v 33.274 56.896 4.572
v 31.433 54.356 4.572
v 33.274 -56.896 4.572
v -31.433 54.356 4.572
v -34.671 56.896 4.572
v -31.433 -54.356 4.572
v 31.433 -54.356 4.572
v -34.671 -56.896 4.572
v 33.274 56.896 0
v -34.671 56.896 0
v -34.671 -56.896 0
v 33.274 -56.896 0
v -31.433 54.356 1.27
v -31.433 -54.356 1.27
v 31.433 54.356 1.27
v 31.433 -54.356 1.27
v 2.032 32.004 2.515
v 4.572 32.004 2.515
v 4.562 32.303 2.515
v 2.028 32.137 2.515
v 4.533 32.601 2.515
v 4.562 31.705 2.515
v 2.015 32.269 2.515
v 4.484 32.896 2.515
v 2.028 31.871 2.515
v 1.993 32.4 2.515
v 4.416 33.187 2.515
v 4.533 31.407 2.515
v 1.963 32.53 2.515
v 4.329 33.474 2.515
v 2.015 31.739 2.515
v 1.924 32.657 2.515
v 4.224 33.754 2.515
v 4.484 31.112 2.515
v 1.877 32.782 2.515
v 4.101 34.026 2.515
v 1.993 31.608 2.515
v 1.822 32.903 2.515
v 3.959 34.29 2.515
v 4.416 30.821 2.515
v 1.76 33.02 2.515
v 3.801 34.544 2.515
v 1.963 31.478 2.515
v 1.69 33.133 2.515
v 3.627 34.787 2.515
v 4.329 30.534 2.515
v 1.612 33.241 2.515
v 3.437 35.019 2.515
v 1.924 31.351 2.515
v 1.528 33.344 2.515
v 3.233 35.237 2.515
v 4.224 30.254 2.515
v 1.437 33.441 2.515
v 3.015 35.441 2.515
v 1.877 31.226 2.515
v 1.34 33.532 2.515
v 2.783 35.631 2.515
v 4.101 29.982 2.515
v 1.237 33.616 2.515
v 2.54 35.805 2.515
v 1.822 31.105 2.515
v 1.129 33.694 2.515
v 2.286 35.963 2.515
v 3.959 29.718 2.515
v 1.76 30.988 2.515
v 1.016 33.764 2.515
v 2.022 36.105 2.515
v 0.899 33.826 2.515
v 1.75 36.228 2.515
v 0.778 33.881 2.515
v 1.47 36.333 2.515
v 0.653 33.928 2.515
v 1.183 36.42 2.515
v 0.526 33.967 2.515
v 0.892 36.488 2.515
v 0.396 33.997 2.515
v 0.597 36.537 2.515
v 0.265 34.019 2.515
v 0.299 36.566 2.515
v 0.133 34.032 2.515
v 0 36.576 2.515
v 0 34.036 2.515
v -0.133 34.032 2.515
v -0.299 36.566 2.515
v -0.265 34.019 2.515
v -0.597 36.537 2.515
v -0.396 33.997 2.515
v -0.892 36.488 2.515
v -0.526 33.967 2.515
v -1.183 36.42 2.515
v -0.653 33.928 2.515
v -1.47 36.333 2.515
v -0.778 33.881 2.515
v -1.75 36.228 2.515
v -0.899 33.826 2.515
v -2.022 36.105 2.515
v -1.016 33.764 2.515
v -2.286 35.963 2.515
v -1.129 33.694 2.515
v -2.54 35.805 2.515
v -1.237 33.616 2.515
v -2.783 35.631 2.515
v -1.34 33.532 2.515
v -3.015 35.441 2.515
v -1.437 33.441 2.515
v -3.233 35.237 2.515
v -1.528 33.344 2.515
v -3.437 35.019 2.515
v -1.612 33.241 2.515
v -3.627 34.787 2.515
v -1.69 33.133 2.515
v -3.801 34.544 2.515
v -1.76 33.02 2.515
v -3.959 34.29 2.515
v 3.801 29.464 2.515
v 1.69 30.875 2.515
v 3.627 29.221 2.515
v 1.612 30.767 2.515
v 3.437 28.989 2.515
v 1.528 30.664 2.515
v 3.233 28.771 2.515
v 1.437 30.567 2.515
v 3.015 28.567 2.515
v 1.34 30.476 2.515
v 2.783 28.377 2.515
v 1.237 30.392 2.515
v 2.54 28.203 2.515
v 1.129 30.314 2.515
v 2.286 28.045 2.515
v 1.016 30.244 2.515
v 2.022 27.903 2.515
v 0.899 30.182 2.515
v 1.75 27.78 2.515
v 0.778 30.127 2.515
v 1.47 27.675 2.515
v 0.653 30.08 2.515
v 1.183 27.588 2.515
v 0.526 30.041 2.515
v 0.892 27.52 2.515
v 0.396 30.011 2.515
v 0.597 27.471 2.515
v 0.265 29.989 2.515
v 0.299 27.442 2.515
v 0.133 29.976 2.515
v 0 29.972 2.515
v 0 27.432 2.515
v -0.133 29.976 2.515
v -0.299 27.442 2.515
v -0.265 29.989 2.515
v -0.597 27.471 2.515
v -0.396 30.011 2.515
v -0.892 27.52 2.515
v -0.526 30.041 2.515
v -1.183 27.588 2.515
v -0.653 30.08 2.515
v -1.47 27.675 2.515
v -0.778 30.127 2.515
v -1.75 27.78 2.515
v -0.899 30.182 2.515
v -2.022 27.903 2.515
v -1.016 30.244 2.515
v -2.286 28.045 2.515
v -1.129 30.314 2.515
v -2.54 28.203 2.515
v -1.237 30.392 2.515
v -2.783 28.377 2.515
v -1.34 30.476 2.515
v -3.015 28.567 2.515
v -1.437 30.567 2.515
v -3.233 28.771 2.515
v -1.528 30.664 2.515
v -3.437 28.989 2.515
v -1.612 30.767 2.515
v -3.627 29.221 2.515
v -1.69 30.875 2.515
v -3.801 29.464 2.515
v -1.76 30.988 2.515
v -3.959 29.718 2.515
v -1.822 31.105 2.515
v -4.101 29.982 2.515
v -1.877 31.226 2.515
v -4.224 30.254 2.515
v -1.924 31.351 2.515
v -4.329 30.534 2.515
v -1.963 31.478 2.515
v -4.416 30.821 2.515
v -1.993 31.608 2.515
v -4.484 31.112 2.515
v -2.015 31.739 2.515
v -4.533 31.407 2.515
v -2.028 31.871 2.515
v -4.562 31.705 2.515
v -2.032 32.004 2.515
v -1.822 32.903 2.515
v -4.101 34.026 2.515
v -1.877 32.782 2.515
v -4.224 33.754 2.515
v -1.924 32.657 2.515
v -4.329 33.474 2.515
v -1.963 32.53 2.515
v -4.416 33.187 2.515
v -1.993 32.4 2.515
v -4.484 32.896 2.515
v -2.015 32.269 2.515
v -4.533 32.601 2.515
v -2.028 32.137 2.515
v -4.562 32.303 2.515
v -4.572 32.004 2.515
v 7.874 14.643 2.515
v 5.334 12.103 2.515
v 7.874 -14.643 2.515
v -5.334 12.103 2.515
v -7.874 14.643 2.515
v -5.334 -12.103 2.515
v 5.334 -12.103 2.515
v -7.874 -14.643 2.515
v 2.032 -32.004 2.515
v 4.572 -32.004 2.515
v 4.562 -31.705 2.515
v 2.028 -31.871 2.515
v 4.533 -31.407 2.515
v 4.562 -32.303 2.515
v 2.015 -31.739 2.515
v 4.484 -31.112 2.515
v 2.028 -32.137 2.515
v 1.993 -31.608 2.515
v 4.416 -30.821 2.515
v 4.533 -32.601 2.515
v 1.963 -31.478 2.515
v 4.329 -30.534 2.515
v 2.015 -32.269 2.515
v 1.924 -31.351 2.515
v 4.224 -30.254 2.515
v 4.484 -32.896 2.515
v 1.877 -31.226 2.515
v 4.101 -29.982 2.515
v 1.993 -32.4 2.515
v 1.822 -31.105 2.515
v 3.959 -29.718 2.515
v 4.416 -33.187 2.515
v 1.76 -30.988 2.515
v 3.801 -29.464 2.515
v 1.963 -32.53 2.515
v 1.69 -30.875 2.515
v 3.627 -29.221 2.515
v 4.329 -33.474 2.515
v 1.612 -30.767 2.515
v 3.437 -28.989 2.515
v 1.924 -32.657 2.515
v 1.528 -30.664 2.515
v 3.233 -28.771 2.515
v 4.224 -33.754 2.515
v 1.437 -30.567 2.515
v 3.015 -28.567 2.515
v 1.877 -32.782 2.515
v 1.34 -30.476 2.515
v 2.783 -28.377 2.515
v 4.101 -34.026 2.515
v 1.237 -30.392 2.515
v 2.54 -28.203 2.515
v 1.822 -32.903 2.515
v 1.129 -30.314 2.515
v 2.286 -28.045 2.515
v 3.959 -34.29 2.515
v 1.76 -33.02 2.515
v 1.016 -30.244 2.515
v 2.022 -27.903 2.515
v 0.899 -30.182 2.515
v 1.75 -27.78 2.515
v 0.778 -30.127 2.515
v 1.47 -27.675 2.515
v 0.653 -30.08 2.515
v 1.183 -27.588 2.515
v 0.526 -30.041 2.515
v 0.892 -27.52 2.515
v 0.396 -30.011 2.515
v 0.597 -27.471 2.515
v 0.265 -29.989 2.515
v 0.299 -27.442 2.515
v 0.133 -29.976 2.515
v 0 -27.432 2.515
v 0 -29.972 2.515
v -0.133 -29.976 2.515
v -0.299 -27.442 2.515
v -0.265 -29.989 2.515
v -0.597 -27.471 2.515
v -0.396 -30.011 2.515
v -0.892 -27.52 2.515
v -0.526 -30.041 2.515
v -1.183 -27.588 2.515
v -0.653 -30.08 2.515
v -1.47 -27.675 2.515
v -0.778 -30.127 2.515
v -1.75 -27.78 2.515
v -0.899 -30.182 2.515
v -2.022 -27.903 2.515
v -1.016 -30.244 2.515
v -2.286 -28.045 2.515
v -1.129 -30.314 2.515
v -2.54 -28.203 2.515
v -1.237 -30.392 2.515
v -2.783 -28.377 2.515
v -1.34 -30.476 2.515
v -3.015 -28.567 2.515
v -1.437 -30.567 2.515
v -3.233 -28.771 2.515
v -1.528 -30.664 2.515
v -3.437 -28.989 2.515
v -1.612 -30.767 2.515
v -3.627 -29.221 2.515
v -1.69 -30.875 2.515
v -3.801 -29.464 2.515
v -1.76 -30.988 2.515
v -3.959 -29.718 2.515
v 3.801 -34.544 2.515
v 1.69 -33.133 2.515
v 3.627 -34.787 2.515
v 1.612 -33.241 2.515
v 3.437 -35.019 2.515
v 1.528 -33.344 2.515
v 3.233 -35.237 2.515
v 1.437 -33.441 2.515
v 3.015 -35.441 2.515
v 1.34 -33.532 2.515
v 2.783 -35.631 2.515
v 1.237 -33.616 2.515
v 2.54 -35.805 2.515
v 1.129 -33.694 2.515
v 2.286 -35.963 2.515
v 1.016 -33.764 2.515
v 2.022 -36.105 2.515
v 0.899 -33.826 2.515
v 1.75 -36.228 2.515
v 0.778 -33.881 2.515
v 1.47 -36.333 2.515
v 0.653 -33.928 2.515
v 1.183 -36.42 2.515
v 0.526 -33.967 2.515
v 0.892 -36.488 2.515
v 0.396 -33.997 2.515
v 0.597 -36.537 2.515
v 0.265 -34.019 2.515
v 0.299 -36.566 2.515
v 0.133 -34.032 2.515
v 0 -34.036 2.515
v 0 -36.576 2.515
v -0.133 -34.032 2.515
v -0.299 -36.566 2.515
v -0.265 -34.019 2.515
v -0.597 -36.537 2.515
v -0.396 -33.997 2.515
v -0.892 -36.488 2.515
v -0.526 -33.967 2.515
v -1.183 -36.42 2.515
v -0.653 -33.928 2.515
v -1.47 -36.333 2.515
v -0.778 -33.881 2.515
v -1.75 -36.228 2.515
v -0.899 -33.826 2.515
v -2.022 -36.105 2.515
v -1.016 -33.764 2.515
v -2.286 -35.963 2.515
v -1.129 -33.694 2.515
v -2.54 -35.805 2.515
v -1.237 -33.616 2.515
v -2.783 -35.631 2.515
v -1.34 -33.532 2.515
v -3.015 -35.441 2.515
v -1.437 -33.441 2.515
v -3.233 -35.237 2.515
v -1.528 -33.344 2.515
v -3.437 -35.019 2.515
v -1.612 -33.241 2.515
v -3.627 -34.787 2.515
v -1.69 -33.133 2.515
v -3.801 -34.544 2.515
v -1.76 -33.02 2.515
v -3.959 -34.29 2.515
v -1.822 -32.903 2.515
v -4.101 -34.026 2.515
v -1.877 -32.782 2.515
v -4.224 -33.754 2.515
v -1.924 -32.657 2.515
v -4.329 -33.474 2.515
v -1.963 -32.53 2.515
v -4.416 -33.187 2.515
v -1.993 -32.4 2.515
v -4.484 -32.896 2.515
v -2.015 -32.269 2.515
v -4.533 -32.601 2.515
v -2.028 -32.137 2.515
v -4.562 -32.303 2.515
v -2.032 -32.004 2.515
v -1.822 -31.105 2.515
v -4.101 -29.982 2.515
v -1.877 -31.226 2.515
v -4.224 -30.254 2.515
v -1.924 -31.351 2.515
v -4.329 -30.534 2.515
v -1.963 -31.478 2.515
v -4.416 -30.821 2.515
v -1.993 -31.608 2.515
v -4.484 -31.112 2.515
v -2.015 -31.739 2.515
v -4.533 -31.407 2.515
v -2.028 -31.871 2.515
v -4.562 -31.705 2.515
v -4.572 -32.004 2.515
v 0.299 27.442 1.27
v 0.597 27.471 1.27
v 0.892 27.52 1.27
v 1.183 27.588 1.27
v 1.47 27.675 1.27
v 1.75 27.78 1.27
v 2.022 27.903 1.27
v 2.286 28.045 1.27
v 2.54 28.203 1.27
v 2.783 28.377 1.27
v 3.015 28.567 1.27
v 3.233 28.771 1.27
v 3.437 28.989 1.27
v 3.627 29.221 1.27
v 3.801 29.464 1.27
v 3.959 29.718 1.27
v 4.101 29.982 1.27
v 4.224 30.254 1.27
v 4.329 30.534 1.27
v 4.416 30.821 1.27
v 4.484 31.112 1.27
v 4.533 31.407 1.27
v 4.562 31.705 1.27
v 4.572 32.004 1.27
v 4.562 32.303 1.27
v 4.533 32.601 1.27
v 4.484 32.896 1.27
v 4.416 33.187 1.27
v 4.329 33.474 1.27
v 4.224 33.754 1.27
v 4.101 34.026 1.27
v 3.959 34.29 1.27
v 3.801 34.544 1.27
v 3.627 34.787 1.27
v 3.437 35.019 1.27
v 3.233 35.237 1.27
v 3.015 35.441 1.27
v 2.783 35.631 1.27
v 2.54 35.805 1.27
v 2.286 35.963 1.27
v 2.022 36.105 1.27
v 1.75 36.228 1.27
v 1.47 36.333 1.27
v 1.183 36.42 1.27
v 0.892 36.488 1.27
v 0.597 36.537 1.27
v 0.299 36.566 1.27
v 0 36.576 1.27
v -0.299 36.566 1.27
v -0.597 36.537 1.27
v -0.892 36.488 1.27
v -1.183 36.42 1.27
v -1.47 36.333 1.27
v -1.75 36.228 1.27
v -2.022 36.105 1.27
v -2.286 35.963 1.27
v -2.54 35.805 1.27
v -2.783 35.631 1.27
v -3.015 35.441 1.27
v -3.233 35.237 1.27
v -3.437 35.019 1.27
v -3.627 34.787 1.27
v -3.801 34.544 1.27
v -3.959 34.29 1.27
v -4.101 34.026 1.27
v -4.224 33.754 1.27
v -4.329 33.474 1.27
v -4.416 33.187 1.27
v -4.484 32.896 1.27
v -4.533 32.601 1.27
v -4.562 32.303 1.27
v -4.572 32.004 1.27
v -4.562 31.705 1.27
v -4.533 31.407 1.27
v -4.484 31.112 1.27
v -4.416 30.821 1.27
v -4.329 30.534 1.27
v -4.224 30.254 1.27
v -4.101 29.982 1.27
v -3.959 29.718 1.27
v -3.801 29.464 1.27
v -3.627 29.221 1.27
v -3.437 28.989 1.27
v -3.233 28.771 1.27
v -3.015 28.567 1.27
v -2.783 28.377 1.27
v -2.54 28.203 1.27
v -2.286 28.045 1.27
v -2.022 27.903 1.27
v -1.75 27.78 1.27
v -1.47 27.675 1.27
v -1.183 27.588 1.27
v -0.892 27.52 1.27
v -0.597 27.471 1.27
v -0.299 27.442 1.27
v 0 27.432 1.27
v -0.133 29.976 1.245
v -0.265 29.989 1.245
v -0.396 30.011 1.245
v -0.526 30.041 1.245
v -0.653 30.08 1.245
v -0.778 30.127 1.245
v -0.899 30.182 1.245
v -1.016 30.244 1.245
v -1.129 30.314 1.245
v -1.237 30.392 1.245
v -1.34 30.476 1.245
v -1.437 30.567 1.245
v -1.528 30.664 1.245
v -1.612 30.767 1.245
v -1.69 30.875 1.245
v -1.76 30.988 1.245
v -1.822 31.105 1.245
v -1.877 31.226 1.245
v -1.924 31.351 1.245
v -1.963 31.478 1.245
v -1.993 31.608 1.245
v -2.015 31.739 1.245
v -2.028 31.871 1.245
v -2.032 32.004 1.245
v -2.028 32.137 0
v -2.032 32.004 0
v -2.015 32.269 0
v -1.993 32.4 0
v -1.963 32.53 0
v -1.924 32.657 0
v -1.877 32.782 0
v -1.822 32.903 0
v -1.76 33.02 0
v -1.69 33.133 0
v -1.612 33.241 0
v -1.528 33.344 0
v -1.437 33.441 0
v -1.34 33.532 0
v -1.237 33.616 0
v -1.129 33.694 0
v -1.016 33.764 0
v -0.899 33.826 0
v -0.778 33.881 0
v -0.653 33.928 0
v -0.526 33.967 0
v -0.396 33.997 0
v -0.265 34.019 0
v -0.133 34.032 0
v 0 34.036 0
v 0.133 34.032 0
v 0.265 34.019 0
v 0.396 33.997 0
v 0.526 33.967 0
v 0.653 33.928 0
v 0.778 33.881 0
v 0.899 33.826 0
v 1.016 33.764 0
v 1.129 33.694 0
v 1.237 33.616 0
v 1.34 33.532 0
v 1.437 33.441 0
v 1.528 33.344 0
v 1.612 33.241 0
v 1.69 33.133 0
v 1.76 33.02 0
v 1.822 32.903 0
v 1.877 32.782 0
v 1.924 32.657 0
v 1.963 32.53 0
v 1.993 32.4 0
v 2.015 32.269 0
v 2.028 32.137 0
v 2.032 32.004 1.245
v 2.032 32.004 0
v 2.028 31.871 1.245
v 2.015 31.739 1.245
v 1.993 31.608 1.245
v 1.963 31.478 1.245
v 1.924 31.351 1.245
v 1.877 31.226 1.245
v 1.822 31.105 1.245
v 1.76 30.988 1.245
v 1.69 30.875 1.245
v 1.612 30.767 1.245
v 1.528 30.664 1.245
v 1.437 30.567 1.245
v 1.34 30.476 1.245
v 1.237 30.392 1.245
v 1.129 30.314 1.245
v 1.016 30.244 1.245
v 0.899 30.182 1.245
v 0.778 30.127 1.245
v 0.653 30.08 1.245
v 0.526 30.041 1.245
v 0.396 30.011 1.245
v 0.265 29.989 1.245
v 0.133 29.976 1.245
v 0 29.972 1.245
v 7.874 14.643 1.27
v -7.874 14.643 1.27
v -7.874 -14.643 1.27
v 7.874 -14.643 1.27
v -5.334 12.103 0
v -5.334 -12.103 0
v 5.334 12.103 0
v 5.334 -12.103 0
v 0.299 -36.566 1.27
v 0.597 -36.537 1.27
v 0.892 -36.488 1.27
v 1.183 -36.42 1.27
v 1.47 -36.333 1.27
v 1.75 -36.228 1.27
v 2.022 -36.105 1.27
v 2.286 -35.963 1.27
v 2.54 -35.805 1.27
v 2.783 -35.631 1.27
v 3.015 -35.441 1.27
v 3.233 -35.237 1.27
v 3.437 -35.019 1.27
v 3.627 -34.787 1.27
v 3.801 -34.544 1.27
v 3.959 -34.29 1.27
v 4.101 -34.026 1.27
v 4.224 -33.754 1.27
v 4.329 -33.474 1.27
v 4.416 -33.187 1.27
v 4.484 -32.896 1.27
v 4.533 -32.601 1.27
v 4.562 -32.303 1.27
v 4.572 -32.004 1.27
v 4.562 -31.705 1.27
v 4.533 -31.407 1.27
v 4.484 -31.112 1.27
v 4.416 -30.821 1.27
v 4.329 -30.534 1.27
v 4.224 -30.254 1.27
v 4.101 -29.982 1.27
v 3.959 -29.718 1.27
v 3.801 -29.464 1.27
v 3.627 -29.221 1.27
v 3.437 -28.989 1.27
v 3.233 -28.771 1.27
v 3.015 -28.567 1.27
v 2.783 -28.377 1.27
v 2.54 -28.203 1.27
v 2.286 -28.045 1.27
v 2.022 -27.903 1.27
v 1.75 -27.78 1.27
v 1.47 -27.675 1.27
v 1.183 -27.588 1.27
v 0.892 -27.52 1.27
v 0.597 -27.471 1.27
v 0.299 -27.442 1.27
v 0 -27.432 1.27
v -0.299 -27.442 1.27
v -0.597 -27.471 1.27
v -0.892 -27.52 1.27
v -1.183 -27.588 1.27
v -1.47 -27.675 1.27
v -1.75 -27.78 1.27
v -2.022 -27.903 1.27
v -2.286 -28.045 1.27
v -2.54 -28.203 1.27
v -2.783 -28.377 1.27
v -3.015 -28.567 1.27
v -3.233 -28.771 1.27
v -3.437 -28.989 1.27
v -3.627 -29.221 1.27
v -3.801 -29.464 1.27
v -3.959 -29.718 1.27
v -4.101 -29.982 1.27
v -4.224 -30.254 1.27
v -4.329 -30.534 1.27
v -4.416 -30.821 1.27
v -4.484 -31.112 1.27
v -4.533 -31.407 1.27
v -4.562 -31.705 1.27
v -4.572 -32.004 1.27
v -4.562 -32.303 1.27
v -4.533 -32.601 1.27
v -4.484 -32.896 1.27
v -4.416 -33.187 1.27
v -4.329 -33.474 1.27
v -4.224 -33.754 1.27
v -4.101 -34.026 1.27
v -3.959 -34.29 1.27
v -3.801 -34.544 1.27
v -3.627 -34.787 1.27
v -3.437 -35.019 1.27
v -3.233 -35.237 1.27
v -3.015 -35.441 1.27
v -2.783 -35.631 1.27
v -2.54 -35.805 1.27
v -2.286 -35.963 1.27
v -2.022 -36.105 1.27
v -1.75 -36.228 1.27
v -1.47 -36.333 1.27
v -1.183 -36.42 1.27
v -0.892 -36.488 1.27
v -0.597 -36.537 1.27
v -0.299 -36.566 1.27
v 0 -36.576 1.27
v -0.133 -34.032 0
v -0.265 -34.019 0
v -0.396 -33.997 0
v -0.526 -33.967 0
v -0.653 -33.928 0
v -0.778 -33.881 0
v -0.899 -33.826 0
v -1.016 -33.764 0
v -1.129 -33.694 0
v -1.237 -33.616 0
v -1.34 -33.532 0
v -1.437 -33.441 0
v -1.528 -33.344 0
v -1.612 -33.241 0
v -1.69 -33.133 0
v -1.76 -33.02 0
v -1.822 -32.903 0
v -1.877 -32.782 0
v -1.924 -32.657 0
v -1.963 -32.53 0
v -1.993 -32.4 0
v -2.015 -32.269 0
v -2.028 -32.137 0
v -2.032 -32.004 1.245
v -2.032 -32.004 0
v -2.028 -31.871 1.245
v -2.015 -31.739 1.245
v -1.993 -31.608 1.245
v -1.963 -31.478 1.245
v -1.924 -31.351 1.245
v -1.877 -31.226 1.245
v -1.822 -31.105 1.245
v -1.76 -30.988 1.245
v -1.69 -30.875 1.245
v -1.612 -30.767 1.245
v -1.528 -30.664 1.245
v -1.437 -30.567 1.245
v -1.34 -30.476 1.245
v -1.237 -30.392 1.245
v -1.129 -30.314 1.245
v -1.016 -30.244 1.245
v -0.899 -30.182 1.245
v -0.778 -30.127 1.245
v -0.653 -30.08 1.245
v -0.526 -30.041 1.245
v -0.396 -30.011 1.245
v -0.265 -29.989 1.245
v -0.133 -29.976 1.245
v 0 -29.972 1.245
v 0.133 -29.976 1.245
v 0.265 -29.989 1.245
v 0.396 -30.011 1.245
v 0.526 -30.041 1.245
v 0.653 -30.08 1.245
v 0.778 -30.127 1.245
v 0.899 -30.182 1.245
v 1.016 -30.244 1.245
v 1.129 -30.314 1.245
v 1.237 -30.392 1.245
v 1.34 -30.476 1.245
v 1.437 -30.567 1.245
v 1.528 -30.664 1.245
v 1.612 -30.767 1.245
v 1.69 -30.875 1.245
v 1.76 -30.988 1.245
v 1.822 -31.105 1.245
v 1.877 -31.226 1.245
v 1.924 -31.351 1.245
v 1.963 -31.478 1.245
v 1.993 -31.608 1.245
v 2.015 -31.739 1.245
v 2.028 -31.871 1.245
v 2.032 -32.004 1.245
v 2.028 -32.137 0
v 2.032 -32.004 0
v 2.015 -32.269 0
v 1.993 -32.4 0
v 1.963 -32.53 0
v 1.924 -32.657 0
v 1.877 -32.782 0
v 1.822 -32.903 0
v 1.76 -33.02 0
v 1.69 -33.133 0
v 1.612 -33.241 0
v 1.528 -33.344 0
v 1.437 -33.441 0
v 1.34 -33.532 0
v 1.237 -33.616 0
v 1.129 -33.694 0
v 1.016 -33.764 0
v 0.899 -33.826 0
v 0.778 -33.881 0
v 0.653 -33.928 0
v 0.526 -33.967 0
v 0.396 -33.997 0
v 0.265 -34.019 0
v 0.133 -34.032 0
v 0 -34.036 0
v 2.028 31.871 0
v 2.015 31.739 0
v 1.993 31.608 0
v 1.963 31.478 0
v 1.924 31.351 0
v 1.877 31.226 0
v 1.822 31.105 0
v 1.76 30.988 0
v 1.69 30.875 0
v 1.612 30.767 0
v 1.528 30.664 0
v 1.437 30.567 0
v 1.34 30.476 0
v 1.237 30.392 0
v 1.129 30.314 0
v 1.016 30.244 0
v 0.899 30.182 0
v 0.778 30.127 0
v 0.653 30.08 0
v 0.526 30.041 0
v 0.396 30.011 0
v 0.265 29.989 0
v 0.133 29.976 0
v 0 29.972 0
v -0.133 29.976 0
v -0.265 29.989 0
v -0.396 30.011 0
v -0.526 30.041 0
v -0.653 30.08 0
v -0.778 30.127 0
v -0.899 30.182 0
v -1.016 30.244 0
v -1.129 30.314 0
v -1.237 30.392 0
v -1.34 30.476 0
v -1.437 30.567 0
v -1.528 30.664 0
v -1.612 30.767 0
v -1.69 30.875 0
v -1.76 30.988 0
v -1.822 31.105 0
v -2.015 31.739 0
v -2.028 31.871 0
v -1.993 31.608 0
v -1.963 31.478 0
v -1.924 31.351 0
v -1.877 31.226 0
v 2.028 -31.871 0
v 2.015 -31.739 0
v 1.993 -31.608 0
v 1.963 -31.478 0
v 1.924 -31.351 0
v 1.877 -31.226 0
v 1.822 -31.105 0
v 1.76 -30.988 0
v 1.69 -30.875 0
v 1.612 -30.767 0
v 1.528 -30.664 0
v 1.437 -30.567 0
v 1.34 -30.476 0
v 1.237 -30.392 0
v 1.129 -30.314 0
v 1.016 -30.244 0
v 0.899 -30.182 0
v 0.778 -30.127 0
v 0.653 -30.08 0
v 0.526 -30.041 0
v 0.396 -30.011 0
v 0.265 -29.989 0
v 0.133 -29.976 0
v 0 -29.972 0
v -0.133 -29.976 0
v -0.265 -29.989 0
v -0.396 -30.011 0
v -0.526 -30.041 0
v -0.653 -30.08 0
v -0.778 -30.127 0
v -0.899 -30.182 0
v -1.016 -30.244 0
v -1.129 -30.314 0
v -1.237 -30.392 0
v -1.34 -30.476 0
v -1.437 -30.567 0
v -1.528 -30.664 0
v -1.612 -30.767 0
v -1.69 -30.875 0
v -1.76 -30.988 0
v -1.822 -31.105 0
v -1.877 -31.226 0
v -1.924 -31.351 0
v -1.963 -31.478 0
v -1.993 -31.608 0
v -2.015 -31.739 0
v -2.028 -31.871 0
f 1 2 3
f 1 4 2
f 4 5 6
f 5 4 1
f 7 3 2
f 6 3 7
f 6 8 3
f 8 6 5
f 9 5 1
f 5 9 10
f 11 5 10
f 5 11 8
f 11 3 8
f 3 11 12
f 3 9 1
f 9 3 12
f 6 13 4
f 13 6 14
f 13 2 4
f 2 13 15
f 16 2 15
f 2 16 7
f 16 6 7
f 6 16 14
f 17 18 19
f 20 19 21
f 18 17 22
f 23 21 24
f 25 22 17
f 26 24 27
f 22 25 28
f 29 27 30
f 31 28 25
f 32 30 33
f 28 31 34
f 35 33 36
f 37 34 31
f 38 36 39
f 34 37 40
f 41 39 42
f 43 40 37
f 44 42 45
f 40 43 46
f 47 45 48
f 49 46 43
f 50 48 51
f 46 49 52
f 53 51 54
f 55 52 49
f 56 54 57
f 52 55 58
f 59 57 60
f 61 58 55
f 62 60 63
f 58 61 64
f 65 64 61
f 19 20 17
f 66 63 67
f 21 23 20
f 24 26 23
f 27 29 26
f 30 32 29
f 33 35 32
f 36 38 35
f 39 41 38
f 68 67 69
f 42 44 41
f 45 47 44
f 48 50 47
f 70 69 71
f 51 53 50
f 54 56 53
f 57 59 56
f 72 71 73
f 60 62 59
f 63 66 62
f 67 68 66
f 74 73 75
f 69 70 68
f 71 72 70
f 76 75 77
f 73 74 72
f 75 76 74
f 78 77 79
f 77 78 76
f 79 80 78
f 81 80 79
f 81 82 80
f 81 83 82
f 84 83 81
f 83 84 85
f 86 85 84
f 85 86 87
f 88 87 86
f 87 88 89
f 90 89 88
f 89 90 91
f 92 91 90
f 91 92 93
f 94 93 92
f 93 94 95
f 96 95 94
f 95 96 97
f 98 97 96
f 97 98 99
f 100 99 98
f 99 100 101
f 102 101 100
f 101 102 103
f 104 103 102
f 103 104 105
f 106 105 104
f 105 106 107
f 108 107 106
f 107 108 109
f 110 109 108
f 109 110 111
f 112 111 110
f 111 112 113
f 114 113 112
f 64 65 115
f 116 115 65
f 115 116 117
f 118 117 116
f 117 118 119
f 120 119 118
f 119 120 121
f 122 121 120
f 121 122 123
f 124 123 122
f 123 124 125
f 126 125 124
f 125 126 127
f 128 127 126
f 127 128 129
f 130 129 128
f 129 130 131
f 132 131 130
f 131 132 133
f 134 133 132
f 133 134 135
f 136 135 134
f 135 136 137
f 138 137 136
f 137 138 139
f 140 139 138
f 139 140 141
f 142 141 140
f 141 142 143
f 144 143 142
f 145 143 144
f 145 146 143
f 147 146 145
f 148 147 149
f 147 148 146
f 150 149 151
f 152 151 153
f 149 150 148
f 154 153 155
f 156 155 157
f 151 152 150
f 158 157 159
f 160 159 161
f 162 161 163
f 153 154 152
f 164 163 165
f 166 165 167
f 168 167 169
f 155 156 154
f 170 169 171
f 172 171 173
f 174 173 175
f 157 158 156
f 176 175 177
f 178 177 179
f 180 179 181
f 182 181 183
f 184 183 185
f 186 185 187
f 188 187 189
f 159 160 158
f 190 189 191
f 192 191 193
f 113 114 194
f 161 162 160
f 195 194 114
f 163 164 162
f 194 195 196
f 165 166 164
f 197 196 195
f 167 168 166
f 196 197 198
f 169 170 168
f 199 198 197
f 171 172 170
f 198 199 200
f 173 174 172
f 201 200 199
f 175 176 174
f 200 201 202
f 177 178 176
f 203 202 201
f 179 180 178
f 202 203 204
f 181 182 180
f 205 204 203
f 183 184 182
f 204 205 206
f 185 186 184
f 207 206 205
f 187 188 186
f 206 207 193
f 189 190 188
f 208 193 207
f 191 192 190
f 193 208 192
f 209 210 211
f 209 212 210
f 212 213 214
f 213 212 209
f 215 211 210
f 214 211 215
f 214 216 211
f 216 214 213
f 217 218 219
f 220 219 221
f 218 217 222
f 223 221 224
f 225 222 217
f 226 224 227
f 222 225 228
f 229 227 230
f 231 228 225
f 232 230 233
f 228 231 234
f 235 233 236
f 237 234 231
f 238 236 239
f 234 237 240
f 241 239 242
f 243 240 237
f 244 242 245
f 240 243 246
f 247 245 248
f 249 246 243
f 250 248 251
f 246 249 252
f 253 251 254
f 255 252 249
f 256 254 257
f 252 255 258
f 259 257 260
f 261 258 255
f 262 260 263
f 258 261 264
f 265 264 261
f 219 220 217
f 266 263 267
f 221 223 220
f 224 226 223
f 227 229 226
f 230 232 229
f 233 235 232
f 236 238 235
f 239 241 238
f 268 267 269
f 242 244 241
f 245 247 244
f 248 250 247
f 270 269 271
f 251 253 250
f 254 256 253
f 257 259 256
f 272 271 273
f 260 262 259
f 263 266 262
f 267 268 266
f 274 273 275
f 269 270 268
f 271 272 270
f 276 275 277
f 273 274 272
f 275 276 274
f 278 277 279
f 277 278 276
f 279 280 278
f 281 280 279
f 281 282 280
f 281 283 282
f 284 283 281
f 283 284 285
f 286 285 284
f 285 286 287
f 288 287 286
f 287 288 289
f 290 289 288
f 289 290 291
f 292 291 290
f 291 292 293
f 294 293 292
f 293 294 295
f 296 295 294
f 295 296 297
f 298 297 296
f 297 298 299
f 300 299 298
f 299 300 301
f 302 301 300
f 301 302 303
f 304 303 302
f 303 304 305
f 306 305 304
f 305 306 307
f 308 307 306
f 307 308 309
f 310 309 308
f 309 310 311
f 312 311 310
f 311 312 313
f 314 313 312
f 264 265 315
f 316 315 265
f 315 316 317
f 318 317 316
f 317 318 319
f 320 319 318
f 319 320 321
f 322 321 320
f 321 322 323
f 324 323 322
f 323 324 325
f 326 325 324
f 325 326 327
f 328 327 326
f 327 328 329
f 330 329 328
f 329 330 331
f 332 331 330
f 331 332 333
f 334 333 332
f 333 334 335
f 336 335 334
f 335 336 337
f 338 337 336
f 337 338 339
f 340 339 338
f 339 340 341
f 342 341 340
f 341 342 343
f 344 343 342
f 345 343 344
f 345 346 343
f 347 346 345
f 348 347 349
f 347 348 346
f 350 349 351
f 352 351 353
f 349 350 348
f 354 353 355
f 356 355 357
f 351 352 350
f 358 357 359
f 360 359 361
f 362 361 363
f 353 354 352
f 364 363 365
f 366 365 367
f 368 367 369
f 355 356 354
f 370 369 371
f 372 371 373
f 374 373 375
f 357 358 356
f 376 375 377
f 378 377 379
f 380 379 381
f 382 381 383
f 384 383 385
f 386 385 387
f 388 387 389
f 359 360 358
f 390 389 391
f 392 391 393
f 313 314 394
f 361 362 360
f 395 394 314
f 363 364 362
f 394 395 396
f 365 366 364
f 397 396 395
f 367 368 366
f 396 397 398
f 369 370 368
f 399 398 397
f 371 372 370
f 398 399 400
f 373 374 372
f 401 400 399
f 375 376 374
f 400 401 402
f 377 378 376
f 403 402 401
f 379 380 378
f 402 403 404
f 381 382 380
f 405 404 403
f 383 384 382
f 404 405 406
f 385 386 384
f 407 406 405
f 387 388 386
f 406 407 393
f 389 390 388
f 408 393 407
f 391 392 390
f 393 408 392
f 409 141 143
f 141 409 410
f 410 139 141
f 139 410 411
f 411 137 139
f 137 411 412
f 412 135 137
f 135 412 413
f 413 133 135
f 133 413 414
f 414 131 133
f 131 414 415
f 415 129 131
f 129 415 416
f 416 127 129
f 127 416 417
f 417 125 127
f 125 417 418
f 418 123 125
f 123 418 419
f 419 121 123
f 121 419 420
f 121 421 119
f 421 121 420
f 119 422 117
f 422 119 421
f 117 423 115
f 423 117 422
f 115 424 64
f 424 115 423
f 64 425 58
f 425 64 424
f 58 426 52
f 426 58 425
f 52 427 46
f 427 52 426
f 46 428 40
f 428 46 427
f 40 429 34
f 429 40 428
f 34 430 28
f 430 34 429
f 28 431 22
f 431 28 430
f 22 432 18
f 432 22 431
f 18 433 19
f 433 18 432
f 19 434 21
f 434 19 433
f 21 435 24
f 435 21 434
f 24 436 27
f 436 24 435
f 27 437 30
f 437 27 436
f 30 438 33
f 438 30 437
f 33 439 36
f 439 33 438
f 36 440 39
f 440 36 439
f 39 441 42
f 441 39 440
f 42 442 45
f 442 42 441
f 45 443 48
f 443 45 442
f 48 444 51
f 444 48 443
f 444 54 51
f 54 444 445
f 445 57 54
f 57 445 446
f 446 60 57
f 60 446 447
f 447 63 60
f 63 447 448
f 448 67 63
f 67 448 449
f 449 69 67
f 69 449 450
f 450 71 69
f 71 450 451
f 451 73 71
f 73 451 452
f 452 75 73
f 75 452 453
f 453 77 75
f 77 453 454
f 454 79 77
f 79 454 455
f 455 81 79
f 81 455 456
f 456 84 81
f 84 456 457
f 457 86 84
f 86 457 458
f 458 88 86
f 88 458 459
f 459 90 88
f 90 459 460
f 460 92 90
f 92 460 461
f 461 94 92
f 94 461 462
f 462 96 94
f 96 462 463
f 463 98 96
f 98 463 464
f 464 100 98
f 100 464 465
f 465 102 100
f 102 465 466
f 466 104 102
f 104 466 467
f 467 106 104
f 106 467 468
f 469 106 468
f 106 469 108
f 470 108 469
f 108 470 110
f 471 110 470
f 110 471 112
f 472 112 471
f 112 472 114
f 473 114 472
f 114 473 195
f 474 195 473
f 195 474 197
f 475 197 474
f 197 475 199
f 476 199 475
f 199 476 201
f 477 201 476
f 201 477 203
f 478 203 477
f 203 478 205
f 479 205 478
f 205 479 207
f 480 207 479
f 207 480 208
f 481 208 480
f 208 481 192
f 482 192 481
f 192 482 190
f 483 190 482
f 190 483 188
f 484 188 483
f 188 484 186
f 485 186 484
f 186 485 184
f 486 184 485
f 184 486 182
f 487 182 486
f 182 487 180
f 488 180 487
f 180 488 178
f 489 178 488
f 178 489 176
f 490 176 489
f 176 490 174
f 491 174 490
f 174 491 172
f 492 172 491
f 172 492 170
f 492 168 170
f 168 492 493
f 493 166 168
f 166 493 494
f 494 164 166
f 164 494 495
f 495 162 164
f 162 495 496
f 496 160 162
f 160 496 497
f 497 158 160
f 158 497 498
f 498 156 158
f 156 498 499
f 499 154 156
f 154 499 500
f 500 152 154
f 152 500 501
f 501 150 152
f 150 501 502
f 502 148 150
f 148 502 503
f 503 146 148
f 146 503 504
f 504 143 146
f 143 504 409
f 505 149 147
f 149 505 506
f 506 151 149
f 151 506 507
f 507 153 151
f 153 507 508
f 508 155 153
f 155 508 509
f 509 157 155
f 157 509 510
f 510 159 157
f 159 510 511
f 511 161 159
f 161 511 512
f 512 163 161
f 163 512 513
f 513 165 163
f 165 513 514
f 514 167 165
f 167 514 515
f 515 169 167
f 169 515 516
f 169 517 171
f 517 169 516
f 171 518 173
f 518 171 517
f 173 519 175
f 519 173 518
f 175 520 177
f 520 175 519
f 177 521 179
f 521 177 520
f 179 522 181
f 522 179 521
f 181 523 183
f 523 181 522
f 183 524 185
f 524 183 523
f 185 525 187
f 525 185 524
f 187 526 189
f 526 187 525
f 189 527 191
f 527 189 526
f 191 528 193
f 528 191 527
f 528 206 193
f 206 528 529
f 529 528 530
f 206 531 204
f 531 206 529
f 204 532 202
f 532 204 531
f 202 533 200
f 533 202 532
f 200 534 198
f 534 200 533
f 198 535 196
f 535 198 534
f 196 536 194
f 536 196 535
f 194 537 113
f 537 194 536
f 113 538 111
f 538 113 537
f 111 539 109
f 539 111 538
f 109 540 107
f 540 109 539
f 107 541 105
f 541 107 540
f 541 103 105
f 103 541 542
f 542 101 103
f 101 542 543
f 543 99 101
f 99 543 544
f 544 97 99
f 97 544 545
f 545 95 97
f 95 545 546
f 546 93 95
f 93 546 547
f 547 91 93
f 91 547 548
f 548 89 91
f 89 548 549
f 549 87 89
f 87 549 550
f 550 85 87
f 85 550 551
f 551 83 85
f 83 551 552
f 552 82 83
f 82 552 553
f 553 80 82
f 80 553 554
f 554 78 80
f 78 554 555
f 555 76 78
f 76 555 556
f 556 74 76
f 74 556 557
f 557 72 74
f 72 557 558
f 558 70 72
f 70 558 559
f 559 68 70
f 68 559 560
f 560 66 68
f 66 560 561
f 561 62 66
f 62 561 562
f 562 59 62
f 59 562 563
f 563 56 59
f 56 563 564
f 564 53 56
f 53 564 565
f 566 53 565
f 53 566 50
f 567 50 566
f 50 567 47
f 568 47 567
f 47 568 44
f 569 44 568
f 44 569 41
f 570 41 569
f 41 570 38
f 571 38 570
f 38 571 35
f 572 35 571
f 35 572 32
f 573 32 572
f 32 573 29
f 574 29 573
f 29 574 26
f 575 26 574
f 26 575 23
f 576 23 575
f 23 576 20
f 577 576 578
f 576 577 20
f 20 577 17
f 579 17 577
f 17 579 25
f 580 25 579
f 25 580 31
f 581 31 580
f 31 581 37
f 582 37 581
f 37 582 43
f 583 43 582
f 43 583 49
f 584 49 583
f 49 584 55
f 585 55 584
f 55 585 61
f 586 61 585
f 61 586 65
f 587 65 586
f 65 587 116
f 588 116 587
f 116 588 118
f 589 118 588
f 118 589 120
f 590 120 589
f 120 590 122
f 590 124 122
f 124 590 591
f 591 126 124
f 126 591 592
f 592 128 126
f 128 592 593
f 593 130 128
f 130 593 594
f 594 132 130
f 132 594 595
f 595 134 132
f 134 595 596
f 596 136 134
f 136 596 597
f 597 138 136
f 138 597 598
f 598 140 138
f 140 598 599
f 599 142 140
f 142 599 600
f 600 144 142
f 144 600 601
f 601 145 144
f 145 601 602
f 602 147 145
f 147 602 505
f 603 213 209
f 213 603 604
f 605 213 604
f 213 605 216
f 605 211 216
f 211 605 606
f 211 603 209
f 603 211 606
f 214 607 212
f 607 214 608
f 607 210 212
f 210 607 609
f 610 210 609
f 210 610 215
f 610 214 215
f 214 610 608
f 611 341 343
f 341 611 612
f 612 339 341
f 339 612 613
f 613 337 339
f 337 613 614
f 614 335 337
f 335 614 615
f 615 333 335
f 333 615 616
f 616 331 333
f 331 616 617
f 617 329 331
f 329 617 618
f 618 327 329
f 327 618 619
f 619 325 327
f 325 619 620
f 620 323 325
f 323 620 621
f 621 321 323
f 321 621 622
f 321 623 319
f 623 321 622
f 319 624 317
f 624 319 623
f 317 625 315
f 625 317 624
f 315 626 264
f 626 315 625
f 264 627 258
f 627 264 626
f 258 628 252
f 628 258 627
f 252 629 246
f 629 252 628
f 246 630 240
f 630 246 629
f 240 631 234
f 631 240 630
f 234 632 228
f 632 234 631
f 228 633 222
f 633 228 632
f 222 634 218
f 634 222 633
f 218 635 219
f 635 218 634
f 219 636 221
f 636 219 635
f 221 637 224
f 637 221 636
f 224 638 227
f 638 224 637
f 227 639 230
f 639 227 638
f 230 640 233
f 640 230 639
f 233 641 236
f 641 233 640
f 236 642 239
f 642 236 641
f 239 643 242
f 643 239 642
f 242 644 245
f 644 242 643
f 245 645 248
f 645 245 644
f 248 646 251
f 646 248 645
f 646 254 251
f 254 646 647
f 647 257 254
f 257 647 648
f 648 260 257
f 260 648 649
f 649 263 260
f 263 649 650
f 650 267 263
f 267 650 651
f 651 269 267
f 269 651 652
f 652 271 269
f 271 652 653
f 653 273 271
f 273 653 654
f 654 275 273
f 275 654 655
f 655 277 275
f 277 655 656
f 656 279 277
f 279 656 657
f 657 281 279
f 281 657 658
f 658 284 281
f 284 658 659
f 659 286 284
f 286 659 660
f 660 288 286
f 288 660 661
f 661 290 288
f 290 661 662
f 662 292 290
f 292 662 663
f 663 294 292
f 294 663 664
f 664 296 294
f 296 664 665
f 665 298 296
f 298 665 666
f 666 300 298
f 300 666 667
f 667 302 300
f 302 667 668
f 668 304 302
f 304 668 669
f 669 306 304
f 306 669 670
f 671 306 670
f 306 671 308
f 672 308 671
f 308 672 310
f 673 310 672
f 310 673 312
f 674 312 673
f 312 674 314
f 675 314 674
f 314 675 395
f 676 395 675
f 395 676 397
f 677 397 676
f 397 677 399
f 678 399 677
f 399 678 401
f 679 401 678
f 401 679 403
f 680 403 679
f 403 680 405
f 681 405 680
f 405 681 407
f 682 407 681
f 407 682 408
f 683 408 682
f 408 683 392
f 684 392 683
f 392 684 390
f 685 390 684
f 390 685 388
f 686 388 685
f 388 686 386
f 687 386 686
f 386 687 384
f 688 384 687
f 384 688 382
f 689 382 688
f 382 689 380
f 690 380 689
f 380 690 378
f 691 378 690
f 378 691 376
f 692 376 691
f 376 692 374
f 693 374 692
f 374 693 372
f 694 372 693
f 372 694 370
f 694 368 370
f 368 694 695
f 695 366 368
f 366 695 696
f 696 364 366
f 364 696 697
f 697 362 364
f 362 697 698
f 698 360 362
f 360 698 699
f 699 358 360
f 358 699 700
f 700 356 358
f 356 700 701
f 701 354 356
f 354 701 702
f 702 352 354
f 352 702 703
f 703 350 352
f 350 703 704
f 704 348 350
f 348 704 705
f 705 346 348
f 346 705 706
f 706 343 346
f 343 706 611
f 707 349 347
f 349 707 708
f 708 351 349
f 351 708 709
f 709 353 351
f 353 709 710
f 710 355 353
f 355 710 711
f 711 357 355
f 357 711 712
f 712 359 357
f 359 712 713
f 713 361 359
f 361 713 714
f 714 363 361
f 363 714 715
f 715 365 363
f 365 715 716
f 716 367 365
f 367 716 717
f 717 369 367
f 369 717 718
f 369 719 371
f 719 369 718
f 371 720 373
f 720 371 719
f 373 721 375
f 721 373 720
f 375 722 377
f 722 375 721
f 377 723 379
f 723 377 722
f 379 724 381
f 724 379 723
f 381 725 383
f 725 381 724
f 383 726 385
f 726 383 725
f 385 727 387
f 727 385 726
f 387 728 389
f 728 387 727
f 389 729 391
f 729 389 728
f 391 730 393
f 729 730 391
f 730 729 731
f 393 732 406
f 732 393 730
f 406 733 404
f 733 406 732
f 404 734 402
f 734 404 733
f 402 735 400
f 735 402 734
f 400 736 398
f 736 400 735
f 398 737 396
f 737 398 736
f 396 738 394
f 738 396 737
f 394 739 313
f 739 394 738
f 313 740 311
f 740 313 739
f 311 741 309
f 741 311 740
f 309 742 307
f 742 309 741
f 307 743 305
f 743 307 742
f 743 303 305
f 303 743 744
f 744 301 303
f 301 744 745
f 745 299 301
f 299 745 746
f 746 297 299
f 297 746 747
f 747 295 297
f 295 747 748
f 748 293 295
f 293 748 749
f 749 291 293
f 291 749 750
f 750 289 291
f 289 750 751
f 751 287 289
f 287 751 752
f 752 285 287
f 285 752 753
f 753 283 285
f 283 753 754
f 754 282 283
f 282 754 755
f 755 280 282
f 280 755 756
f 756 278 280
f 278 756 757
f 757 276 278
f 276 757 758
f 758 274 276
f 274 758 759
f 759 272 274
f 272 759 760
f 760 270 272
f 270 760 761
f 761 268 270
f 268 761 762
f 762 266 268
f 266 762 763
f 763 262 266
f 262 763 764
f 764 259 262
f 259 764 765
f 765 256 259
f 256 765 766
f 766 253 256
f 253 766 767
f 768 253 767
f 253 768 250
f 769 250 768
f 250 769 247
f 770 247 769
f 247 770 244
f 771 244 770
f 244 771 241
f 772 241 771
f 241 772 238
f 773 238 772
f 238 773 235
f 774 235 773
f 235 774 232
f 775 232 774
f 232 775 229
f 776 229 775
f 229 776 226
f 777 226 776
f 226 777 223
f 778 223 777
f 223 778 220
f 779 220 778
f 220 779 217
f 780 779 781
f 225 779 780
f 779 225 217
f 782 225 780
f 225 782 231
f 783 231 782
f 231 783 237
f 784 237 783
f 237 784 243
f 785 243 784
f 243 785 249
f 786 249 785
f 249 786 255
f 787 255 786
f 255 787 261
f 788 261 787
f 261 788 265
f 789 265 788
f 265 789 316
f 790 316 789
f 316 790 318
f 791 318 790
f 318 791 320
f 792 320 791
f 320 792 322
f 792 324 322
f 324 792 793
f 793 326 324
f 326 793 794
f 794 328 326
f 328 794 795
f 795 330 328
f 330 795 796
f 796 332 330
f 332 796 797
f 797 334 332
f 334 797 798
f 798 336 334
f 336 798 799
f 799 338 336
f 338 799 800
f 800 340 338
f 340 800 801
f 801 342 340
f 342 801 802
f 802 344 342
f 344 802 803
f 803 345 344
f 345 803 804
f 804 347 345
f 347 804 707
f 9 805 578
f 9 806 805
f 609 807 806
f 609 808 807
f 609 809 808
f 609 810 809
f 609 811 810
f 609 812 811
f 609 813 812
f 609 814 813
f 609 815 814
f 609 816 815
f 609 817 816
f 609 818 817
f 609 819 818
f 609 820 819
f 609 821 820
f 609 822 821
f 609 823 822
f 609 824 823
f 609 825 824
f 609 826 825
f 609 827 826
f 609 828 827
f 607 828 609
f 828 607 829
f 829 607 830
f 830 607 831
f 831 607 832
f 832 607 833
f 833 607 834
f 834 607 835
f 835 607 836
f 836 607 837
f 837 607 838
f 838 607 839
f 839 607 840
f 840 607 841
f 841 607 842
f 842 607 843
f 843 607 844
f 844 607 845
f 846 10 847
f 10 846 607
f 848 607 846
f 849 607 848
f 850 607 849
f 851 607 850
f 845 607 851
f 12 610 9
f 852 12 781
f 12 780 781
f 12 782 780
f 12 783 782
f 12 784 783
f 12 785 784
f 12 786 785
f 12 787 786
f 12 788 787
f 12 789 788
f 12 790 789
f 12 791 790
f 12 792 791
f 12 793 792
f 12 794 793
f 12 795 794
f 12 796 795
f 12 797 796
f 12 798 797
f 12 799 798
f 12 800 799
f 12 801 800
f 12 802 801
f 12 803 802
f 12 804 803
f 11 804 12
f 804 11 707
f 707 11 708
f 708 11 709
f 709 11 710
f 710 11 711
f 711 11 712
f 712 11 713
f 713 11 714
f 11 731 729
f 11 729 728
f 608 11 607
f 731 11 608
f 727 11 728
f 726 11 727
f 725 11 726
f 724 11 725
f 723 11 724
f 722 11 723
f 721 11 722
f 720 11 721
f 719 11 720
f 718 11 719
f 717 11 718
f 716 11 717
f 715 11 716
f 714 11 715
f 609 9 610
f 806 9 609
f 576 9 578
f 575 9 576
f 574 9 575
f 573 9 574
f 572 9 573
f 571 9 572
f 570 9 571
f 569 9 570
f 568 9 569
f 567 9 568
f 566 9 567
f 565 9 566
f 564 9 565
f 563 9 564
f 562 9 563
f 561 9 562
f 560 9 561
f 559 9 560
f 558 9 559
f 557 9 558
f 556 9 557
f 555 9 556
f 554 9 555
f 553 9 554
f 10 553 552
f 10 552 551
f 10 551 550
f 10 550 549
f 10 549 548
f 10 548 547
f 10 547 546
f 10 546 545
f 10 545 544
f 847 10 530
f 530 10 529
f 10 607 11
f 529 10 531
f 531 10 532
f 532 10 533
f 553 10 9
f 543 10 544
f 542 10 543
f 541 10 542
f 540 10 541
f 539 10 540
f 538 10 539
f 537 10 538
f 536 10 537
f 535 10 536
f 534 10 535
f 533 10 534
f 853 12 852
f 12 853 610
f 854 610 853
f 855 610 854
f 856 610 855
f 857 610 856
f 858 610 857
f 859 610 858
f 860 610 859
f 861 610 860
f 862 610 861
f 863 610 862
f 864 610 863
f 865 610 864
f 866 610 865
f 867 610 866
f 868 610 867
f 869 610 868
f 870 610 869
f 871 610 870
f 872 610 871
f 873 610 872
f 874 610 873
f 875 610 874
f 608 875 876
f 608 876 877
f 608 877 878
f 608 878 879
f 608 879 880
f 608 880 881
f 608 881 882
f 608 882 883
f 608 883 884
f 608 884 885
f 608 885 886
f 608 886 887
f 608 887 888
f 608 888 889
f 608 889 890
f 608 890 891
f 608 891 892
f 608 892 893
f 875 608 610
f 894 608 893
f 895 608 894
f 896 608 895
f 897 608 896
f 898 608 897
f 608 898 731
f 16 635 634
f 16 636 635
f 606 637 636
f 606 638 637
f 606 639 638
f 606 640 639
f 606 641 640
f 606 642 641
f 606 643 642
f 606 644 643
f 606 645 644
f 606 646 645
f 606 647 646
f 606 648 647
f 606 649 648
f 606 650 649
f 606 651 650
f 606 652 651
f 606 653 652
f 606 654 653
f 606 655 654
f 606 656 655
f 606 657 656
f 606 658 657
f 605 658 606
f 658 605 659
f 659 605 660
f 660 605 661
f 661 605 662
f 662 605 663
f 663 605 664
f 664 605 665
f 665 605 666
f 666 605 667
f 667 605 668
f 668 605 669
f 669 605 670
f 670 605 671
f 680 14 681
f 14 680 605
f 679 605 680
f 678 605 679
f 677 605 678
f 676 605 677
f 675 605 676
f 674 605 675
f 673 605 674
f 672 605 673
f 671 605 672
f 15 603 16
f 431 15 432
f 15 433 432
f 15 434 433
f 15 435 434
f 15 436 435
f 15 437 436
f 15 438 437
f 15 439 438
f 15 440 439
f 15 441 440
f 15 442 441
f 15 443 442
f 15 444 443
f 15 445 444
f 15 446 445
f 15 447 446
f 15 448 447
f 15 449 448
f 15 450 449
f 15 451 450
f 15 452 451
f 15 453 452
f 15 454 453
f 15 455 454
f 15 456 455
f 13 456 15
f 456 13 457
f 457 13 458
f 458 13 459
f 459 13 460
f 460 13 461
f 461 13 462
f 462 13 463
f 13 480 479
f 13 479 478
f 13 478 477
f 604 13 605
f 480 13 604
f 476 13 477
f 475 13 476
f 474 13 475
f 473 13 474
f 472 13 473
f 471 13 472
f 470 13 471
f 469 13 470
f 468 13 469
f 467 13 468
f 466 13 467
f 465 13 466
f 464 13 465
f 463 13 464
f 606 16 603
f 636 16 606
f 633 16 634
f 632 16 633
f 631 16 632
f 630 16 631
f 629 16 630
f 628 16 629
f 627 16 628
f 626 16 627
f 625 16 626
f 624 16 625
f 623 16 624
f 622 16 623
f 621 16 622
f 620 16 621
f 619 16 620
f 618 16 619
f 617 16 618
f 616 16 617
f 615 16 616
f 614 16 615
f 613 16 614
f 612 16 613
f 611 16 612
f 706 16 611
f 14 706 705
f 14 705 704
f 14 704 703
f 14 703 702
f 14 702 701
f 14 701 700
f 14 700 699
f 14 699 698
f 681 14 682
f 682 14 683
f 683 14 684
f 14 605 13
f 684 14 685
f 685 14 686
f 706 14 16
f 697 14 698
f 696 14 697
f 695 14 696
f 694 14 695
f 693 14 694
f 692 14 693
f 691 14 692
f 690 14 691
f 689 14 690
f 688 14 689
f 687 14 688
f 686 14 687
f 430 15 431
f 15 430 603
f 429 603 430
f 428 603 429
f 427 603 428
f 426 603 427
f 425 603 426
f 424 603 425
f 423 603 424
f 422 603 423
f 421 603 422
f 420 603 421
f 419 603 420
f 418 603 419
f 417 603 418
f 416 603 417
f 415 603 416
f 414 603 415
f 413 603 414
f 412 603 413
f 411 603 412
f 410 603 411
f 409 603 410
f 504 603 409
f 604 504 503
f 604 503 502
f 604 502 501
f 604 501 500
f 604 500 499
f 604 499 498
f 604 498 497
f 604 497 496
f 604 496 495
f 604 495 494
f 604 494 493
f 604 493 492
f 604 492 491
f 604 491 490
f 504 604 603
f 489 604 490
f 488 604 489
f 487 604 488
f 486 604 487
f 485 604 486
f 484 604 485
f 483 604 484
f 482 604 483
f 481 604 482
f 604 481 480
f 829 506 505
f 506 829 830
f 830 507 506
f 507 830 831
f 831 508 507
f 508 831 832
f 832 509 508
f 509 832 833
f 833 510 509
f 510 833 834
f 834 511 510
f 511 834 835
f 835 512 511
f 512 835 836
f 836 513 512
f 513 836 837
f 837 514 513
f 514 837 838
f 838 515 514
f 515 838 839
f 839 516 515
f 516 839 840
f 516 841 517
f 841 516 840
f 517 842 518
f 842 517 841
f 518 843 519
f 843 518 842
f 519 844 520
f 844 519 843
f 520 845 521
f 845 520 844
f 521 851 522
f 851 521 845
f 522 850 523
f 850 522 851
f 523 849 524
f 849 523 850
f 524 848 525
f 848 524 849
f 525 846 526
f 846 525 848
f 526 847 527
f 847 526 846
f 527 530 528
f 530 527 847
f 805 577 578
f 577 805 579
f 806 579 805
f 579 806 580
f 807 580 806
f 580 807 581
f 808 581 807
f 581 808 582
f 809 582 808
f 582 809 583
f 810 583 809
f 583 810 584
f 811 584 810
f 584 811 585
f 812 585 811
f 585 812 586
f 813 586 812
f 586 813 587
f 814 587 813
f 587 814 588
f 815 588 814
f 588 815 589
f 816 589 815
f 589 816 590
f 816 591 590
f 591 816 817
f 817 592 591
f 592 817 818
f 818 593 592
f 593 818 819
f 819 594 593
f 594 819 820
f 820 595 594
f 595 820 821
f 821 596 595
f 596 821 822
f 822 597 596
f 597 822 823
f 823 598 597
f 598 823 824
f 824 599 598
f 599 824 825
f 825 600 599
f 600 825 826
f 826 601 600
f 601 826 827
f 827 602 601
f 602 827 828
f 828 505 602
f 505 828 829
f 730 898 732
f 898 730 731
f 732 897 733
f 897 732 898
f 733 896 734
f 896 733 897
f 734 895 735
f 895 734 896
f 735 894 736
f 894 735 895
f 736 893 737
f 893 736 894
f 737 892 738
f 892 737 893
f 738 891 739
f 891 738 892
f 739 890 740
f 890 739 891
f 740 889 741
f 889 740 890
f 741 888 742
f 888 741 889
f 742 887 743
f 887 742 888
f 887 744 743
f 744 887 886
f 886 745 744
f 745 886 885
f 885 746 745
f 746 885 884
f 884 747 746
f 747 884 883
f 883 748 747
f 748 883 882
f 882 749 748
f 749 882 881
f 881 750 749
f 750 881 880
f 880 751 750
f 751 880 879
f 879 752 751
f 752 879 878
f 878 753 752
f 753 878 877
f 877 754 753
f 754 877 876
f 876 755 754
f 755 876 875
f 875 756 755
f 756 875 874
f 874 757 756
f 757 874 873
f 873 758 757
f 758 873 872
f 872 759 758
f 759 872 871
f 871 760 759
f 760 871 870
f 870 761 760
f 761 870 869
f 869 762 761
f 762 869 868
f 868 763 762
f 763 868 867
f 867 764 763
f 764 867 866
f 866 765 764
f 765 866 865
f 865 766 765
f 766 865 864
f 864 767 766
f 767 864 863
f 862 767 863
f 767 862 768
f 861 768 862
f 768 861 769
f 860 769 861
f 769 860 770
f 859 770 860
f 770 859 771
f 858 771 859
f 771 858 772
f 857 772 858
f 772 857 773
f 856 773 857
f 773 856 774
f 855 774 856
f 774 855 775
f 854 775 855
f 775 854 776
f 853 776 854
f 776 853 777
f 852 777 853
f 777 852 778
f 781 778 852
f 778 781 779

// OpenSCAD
ViewScale = [0.0254, 0.0254, 0.0254];

//2730
//4480
//
//
//420x953
//
//
//2520
//2200


module cover()
{
    coverx=2730; // Original cover width
    // Side is 1100 from the right of the switch cutout
    cutin=(coverx/2)-420/2-1100;
    echo("cutin is ",cutin);
    linear_extrude(50)
    difference() {
        translate([-cutin/2, 0, 0])
        square([coverx-cutin, 4480], center=true);
        //translate([-2730/2+cutin/2, 0, 0])
        //square([cutin, 4480], center=true);
        // Switch cutout
        square([420, 953], center=true);
        // Hole
        translate([0, 1260, 0])
        circle(160/2, $fn=96);
        // Hole
        translate([0, -1260, 0])
        circle(160/2, $fn=96);
    }
    translate([0, 0, 49]) {
        linear_extrude(131)
        difference() {
            translate([-cutin/2, 0, 0])
            square([2730-cutin, 4480], center=true);
            square([2530-cutin, 4280], center=true);
            *translate([2730/2+300-((2730/2)-1100), 0, 0])
            square([600, 4490], center=true);
        }
        linear_extrude(50) {
            for (ii=[1260,-1260]) {
                translate([0, ii, 0])
                difference() {
                    circle(360/2, $fn=96);
                    circle(160/2, $fn=96);
                }
            }
            difference() {
                square([620, 1153], center=true);
                square([420, 953], center=true);
            }
        }
    }
}

module forViewing()
{
    cover();
}

module forPrinting()
{
}

scale(ViewScale)
{
    forViewing();
}
